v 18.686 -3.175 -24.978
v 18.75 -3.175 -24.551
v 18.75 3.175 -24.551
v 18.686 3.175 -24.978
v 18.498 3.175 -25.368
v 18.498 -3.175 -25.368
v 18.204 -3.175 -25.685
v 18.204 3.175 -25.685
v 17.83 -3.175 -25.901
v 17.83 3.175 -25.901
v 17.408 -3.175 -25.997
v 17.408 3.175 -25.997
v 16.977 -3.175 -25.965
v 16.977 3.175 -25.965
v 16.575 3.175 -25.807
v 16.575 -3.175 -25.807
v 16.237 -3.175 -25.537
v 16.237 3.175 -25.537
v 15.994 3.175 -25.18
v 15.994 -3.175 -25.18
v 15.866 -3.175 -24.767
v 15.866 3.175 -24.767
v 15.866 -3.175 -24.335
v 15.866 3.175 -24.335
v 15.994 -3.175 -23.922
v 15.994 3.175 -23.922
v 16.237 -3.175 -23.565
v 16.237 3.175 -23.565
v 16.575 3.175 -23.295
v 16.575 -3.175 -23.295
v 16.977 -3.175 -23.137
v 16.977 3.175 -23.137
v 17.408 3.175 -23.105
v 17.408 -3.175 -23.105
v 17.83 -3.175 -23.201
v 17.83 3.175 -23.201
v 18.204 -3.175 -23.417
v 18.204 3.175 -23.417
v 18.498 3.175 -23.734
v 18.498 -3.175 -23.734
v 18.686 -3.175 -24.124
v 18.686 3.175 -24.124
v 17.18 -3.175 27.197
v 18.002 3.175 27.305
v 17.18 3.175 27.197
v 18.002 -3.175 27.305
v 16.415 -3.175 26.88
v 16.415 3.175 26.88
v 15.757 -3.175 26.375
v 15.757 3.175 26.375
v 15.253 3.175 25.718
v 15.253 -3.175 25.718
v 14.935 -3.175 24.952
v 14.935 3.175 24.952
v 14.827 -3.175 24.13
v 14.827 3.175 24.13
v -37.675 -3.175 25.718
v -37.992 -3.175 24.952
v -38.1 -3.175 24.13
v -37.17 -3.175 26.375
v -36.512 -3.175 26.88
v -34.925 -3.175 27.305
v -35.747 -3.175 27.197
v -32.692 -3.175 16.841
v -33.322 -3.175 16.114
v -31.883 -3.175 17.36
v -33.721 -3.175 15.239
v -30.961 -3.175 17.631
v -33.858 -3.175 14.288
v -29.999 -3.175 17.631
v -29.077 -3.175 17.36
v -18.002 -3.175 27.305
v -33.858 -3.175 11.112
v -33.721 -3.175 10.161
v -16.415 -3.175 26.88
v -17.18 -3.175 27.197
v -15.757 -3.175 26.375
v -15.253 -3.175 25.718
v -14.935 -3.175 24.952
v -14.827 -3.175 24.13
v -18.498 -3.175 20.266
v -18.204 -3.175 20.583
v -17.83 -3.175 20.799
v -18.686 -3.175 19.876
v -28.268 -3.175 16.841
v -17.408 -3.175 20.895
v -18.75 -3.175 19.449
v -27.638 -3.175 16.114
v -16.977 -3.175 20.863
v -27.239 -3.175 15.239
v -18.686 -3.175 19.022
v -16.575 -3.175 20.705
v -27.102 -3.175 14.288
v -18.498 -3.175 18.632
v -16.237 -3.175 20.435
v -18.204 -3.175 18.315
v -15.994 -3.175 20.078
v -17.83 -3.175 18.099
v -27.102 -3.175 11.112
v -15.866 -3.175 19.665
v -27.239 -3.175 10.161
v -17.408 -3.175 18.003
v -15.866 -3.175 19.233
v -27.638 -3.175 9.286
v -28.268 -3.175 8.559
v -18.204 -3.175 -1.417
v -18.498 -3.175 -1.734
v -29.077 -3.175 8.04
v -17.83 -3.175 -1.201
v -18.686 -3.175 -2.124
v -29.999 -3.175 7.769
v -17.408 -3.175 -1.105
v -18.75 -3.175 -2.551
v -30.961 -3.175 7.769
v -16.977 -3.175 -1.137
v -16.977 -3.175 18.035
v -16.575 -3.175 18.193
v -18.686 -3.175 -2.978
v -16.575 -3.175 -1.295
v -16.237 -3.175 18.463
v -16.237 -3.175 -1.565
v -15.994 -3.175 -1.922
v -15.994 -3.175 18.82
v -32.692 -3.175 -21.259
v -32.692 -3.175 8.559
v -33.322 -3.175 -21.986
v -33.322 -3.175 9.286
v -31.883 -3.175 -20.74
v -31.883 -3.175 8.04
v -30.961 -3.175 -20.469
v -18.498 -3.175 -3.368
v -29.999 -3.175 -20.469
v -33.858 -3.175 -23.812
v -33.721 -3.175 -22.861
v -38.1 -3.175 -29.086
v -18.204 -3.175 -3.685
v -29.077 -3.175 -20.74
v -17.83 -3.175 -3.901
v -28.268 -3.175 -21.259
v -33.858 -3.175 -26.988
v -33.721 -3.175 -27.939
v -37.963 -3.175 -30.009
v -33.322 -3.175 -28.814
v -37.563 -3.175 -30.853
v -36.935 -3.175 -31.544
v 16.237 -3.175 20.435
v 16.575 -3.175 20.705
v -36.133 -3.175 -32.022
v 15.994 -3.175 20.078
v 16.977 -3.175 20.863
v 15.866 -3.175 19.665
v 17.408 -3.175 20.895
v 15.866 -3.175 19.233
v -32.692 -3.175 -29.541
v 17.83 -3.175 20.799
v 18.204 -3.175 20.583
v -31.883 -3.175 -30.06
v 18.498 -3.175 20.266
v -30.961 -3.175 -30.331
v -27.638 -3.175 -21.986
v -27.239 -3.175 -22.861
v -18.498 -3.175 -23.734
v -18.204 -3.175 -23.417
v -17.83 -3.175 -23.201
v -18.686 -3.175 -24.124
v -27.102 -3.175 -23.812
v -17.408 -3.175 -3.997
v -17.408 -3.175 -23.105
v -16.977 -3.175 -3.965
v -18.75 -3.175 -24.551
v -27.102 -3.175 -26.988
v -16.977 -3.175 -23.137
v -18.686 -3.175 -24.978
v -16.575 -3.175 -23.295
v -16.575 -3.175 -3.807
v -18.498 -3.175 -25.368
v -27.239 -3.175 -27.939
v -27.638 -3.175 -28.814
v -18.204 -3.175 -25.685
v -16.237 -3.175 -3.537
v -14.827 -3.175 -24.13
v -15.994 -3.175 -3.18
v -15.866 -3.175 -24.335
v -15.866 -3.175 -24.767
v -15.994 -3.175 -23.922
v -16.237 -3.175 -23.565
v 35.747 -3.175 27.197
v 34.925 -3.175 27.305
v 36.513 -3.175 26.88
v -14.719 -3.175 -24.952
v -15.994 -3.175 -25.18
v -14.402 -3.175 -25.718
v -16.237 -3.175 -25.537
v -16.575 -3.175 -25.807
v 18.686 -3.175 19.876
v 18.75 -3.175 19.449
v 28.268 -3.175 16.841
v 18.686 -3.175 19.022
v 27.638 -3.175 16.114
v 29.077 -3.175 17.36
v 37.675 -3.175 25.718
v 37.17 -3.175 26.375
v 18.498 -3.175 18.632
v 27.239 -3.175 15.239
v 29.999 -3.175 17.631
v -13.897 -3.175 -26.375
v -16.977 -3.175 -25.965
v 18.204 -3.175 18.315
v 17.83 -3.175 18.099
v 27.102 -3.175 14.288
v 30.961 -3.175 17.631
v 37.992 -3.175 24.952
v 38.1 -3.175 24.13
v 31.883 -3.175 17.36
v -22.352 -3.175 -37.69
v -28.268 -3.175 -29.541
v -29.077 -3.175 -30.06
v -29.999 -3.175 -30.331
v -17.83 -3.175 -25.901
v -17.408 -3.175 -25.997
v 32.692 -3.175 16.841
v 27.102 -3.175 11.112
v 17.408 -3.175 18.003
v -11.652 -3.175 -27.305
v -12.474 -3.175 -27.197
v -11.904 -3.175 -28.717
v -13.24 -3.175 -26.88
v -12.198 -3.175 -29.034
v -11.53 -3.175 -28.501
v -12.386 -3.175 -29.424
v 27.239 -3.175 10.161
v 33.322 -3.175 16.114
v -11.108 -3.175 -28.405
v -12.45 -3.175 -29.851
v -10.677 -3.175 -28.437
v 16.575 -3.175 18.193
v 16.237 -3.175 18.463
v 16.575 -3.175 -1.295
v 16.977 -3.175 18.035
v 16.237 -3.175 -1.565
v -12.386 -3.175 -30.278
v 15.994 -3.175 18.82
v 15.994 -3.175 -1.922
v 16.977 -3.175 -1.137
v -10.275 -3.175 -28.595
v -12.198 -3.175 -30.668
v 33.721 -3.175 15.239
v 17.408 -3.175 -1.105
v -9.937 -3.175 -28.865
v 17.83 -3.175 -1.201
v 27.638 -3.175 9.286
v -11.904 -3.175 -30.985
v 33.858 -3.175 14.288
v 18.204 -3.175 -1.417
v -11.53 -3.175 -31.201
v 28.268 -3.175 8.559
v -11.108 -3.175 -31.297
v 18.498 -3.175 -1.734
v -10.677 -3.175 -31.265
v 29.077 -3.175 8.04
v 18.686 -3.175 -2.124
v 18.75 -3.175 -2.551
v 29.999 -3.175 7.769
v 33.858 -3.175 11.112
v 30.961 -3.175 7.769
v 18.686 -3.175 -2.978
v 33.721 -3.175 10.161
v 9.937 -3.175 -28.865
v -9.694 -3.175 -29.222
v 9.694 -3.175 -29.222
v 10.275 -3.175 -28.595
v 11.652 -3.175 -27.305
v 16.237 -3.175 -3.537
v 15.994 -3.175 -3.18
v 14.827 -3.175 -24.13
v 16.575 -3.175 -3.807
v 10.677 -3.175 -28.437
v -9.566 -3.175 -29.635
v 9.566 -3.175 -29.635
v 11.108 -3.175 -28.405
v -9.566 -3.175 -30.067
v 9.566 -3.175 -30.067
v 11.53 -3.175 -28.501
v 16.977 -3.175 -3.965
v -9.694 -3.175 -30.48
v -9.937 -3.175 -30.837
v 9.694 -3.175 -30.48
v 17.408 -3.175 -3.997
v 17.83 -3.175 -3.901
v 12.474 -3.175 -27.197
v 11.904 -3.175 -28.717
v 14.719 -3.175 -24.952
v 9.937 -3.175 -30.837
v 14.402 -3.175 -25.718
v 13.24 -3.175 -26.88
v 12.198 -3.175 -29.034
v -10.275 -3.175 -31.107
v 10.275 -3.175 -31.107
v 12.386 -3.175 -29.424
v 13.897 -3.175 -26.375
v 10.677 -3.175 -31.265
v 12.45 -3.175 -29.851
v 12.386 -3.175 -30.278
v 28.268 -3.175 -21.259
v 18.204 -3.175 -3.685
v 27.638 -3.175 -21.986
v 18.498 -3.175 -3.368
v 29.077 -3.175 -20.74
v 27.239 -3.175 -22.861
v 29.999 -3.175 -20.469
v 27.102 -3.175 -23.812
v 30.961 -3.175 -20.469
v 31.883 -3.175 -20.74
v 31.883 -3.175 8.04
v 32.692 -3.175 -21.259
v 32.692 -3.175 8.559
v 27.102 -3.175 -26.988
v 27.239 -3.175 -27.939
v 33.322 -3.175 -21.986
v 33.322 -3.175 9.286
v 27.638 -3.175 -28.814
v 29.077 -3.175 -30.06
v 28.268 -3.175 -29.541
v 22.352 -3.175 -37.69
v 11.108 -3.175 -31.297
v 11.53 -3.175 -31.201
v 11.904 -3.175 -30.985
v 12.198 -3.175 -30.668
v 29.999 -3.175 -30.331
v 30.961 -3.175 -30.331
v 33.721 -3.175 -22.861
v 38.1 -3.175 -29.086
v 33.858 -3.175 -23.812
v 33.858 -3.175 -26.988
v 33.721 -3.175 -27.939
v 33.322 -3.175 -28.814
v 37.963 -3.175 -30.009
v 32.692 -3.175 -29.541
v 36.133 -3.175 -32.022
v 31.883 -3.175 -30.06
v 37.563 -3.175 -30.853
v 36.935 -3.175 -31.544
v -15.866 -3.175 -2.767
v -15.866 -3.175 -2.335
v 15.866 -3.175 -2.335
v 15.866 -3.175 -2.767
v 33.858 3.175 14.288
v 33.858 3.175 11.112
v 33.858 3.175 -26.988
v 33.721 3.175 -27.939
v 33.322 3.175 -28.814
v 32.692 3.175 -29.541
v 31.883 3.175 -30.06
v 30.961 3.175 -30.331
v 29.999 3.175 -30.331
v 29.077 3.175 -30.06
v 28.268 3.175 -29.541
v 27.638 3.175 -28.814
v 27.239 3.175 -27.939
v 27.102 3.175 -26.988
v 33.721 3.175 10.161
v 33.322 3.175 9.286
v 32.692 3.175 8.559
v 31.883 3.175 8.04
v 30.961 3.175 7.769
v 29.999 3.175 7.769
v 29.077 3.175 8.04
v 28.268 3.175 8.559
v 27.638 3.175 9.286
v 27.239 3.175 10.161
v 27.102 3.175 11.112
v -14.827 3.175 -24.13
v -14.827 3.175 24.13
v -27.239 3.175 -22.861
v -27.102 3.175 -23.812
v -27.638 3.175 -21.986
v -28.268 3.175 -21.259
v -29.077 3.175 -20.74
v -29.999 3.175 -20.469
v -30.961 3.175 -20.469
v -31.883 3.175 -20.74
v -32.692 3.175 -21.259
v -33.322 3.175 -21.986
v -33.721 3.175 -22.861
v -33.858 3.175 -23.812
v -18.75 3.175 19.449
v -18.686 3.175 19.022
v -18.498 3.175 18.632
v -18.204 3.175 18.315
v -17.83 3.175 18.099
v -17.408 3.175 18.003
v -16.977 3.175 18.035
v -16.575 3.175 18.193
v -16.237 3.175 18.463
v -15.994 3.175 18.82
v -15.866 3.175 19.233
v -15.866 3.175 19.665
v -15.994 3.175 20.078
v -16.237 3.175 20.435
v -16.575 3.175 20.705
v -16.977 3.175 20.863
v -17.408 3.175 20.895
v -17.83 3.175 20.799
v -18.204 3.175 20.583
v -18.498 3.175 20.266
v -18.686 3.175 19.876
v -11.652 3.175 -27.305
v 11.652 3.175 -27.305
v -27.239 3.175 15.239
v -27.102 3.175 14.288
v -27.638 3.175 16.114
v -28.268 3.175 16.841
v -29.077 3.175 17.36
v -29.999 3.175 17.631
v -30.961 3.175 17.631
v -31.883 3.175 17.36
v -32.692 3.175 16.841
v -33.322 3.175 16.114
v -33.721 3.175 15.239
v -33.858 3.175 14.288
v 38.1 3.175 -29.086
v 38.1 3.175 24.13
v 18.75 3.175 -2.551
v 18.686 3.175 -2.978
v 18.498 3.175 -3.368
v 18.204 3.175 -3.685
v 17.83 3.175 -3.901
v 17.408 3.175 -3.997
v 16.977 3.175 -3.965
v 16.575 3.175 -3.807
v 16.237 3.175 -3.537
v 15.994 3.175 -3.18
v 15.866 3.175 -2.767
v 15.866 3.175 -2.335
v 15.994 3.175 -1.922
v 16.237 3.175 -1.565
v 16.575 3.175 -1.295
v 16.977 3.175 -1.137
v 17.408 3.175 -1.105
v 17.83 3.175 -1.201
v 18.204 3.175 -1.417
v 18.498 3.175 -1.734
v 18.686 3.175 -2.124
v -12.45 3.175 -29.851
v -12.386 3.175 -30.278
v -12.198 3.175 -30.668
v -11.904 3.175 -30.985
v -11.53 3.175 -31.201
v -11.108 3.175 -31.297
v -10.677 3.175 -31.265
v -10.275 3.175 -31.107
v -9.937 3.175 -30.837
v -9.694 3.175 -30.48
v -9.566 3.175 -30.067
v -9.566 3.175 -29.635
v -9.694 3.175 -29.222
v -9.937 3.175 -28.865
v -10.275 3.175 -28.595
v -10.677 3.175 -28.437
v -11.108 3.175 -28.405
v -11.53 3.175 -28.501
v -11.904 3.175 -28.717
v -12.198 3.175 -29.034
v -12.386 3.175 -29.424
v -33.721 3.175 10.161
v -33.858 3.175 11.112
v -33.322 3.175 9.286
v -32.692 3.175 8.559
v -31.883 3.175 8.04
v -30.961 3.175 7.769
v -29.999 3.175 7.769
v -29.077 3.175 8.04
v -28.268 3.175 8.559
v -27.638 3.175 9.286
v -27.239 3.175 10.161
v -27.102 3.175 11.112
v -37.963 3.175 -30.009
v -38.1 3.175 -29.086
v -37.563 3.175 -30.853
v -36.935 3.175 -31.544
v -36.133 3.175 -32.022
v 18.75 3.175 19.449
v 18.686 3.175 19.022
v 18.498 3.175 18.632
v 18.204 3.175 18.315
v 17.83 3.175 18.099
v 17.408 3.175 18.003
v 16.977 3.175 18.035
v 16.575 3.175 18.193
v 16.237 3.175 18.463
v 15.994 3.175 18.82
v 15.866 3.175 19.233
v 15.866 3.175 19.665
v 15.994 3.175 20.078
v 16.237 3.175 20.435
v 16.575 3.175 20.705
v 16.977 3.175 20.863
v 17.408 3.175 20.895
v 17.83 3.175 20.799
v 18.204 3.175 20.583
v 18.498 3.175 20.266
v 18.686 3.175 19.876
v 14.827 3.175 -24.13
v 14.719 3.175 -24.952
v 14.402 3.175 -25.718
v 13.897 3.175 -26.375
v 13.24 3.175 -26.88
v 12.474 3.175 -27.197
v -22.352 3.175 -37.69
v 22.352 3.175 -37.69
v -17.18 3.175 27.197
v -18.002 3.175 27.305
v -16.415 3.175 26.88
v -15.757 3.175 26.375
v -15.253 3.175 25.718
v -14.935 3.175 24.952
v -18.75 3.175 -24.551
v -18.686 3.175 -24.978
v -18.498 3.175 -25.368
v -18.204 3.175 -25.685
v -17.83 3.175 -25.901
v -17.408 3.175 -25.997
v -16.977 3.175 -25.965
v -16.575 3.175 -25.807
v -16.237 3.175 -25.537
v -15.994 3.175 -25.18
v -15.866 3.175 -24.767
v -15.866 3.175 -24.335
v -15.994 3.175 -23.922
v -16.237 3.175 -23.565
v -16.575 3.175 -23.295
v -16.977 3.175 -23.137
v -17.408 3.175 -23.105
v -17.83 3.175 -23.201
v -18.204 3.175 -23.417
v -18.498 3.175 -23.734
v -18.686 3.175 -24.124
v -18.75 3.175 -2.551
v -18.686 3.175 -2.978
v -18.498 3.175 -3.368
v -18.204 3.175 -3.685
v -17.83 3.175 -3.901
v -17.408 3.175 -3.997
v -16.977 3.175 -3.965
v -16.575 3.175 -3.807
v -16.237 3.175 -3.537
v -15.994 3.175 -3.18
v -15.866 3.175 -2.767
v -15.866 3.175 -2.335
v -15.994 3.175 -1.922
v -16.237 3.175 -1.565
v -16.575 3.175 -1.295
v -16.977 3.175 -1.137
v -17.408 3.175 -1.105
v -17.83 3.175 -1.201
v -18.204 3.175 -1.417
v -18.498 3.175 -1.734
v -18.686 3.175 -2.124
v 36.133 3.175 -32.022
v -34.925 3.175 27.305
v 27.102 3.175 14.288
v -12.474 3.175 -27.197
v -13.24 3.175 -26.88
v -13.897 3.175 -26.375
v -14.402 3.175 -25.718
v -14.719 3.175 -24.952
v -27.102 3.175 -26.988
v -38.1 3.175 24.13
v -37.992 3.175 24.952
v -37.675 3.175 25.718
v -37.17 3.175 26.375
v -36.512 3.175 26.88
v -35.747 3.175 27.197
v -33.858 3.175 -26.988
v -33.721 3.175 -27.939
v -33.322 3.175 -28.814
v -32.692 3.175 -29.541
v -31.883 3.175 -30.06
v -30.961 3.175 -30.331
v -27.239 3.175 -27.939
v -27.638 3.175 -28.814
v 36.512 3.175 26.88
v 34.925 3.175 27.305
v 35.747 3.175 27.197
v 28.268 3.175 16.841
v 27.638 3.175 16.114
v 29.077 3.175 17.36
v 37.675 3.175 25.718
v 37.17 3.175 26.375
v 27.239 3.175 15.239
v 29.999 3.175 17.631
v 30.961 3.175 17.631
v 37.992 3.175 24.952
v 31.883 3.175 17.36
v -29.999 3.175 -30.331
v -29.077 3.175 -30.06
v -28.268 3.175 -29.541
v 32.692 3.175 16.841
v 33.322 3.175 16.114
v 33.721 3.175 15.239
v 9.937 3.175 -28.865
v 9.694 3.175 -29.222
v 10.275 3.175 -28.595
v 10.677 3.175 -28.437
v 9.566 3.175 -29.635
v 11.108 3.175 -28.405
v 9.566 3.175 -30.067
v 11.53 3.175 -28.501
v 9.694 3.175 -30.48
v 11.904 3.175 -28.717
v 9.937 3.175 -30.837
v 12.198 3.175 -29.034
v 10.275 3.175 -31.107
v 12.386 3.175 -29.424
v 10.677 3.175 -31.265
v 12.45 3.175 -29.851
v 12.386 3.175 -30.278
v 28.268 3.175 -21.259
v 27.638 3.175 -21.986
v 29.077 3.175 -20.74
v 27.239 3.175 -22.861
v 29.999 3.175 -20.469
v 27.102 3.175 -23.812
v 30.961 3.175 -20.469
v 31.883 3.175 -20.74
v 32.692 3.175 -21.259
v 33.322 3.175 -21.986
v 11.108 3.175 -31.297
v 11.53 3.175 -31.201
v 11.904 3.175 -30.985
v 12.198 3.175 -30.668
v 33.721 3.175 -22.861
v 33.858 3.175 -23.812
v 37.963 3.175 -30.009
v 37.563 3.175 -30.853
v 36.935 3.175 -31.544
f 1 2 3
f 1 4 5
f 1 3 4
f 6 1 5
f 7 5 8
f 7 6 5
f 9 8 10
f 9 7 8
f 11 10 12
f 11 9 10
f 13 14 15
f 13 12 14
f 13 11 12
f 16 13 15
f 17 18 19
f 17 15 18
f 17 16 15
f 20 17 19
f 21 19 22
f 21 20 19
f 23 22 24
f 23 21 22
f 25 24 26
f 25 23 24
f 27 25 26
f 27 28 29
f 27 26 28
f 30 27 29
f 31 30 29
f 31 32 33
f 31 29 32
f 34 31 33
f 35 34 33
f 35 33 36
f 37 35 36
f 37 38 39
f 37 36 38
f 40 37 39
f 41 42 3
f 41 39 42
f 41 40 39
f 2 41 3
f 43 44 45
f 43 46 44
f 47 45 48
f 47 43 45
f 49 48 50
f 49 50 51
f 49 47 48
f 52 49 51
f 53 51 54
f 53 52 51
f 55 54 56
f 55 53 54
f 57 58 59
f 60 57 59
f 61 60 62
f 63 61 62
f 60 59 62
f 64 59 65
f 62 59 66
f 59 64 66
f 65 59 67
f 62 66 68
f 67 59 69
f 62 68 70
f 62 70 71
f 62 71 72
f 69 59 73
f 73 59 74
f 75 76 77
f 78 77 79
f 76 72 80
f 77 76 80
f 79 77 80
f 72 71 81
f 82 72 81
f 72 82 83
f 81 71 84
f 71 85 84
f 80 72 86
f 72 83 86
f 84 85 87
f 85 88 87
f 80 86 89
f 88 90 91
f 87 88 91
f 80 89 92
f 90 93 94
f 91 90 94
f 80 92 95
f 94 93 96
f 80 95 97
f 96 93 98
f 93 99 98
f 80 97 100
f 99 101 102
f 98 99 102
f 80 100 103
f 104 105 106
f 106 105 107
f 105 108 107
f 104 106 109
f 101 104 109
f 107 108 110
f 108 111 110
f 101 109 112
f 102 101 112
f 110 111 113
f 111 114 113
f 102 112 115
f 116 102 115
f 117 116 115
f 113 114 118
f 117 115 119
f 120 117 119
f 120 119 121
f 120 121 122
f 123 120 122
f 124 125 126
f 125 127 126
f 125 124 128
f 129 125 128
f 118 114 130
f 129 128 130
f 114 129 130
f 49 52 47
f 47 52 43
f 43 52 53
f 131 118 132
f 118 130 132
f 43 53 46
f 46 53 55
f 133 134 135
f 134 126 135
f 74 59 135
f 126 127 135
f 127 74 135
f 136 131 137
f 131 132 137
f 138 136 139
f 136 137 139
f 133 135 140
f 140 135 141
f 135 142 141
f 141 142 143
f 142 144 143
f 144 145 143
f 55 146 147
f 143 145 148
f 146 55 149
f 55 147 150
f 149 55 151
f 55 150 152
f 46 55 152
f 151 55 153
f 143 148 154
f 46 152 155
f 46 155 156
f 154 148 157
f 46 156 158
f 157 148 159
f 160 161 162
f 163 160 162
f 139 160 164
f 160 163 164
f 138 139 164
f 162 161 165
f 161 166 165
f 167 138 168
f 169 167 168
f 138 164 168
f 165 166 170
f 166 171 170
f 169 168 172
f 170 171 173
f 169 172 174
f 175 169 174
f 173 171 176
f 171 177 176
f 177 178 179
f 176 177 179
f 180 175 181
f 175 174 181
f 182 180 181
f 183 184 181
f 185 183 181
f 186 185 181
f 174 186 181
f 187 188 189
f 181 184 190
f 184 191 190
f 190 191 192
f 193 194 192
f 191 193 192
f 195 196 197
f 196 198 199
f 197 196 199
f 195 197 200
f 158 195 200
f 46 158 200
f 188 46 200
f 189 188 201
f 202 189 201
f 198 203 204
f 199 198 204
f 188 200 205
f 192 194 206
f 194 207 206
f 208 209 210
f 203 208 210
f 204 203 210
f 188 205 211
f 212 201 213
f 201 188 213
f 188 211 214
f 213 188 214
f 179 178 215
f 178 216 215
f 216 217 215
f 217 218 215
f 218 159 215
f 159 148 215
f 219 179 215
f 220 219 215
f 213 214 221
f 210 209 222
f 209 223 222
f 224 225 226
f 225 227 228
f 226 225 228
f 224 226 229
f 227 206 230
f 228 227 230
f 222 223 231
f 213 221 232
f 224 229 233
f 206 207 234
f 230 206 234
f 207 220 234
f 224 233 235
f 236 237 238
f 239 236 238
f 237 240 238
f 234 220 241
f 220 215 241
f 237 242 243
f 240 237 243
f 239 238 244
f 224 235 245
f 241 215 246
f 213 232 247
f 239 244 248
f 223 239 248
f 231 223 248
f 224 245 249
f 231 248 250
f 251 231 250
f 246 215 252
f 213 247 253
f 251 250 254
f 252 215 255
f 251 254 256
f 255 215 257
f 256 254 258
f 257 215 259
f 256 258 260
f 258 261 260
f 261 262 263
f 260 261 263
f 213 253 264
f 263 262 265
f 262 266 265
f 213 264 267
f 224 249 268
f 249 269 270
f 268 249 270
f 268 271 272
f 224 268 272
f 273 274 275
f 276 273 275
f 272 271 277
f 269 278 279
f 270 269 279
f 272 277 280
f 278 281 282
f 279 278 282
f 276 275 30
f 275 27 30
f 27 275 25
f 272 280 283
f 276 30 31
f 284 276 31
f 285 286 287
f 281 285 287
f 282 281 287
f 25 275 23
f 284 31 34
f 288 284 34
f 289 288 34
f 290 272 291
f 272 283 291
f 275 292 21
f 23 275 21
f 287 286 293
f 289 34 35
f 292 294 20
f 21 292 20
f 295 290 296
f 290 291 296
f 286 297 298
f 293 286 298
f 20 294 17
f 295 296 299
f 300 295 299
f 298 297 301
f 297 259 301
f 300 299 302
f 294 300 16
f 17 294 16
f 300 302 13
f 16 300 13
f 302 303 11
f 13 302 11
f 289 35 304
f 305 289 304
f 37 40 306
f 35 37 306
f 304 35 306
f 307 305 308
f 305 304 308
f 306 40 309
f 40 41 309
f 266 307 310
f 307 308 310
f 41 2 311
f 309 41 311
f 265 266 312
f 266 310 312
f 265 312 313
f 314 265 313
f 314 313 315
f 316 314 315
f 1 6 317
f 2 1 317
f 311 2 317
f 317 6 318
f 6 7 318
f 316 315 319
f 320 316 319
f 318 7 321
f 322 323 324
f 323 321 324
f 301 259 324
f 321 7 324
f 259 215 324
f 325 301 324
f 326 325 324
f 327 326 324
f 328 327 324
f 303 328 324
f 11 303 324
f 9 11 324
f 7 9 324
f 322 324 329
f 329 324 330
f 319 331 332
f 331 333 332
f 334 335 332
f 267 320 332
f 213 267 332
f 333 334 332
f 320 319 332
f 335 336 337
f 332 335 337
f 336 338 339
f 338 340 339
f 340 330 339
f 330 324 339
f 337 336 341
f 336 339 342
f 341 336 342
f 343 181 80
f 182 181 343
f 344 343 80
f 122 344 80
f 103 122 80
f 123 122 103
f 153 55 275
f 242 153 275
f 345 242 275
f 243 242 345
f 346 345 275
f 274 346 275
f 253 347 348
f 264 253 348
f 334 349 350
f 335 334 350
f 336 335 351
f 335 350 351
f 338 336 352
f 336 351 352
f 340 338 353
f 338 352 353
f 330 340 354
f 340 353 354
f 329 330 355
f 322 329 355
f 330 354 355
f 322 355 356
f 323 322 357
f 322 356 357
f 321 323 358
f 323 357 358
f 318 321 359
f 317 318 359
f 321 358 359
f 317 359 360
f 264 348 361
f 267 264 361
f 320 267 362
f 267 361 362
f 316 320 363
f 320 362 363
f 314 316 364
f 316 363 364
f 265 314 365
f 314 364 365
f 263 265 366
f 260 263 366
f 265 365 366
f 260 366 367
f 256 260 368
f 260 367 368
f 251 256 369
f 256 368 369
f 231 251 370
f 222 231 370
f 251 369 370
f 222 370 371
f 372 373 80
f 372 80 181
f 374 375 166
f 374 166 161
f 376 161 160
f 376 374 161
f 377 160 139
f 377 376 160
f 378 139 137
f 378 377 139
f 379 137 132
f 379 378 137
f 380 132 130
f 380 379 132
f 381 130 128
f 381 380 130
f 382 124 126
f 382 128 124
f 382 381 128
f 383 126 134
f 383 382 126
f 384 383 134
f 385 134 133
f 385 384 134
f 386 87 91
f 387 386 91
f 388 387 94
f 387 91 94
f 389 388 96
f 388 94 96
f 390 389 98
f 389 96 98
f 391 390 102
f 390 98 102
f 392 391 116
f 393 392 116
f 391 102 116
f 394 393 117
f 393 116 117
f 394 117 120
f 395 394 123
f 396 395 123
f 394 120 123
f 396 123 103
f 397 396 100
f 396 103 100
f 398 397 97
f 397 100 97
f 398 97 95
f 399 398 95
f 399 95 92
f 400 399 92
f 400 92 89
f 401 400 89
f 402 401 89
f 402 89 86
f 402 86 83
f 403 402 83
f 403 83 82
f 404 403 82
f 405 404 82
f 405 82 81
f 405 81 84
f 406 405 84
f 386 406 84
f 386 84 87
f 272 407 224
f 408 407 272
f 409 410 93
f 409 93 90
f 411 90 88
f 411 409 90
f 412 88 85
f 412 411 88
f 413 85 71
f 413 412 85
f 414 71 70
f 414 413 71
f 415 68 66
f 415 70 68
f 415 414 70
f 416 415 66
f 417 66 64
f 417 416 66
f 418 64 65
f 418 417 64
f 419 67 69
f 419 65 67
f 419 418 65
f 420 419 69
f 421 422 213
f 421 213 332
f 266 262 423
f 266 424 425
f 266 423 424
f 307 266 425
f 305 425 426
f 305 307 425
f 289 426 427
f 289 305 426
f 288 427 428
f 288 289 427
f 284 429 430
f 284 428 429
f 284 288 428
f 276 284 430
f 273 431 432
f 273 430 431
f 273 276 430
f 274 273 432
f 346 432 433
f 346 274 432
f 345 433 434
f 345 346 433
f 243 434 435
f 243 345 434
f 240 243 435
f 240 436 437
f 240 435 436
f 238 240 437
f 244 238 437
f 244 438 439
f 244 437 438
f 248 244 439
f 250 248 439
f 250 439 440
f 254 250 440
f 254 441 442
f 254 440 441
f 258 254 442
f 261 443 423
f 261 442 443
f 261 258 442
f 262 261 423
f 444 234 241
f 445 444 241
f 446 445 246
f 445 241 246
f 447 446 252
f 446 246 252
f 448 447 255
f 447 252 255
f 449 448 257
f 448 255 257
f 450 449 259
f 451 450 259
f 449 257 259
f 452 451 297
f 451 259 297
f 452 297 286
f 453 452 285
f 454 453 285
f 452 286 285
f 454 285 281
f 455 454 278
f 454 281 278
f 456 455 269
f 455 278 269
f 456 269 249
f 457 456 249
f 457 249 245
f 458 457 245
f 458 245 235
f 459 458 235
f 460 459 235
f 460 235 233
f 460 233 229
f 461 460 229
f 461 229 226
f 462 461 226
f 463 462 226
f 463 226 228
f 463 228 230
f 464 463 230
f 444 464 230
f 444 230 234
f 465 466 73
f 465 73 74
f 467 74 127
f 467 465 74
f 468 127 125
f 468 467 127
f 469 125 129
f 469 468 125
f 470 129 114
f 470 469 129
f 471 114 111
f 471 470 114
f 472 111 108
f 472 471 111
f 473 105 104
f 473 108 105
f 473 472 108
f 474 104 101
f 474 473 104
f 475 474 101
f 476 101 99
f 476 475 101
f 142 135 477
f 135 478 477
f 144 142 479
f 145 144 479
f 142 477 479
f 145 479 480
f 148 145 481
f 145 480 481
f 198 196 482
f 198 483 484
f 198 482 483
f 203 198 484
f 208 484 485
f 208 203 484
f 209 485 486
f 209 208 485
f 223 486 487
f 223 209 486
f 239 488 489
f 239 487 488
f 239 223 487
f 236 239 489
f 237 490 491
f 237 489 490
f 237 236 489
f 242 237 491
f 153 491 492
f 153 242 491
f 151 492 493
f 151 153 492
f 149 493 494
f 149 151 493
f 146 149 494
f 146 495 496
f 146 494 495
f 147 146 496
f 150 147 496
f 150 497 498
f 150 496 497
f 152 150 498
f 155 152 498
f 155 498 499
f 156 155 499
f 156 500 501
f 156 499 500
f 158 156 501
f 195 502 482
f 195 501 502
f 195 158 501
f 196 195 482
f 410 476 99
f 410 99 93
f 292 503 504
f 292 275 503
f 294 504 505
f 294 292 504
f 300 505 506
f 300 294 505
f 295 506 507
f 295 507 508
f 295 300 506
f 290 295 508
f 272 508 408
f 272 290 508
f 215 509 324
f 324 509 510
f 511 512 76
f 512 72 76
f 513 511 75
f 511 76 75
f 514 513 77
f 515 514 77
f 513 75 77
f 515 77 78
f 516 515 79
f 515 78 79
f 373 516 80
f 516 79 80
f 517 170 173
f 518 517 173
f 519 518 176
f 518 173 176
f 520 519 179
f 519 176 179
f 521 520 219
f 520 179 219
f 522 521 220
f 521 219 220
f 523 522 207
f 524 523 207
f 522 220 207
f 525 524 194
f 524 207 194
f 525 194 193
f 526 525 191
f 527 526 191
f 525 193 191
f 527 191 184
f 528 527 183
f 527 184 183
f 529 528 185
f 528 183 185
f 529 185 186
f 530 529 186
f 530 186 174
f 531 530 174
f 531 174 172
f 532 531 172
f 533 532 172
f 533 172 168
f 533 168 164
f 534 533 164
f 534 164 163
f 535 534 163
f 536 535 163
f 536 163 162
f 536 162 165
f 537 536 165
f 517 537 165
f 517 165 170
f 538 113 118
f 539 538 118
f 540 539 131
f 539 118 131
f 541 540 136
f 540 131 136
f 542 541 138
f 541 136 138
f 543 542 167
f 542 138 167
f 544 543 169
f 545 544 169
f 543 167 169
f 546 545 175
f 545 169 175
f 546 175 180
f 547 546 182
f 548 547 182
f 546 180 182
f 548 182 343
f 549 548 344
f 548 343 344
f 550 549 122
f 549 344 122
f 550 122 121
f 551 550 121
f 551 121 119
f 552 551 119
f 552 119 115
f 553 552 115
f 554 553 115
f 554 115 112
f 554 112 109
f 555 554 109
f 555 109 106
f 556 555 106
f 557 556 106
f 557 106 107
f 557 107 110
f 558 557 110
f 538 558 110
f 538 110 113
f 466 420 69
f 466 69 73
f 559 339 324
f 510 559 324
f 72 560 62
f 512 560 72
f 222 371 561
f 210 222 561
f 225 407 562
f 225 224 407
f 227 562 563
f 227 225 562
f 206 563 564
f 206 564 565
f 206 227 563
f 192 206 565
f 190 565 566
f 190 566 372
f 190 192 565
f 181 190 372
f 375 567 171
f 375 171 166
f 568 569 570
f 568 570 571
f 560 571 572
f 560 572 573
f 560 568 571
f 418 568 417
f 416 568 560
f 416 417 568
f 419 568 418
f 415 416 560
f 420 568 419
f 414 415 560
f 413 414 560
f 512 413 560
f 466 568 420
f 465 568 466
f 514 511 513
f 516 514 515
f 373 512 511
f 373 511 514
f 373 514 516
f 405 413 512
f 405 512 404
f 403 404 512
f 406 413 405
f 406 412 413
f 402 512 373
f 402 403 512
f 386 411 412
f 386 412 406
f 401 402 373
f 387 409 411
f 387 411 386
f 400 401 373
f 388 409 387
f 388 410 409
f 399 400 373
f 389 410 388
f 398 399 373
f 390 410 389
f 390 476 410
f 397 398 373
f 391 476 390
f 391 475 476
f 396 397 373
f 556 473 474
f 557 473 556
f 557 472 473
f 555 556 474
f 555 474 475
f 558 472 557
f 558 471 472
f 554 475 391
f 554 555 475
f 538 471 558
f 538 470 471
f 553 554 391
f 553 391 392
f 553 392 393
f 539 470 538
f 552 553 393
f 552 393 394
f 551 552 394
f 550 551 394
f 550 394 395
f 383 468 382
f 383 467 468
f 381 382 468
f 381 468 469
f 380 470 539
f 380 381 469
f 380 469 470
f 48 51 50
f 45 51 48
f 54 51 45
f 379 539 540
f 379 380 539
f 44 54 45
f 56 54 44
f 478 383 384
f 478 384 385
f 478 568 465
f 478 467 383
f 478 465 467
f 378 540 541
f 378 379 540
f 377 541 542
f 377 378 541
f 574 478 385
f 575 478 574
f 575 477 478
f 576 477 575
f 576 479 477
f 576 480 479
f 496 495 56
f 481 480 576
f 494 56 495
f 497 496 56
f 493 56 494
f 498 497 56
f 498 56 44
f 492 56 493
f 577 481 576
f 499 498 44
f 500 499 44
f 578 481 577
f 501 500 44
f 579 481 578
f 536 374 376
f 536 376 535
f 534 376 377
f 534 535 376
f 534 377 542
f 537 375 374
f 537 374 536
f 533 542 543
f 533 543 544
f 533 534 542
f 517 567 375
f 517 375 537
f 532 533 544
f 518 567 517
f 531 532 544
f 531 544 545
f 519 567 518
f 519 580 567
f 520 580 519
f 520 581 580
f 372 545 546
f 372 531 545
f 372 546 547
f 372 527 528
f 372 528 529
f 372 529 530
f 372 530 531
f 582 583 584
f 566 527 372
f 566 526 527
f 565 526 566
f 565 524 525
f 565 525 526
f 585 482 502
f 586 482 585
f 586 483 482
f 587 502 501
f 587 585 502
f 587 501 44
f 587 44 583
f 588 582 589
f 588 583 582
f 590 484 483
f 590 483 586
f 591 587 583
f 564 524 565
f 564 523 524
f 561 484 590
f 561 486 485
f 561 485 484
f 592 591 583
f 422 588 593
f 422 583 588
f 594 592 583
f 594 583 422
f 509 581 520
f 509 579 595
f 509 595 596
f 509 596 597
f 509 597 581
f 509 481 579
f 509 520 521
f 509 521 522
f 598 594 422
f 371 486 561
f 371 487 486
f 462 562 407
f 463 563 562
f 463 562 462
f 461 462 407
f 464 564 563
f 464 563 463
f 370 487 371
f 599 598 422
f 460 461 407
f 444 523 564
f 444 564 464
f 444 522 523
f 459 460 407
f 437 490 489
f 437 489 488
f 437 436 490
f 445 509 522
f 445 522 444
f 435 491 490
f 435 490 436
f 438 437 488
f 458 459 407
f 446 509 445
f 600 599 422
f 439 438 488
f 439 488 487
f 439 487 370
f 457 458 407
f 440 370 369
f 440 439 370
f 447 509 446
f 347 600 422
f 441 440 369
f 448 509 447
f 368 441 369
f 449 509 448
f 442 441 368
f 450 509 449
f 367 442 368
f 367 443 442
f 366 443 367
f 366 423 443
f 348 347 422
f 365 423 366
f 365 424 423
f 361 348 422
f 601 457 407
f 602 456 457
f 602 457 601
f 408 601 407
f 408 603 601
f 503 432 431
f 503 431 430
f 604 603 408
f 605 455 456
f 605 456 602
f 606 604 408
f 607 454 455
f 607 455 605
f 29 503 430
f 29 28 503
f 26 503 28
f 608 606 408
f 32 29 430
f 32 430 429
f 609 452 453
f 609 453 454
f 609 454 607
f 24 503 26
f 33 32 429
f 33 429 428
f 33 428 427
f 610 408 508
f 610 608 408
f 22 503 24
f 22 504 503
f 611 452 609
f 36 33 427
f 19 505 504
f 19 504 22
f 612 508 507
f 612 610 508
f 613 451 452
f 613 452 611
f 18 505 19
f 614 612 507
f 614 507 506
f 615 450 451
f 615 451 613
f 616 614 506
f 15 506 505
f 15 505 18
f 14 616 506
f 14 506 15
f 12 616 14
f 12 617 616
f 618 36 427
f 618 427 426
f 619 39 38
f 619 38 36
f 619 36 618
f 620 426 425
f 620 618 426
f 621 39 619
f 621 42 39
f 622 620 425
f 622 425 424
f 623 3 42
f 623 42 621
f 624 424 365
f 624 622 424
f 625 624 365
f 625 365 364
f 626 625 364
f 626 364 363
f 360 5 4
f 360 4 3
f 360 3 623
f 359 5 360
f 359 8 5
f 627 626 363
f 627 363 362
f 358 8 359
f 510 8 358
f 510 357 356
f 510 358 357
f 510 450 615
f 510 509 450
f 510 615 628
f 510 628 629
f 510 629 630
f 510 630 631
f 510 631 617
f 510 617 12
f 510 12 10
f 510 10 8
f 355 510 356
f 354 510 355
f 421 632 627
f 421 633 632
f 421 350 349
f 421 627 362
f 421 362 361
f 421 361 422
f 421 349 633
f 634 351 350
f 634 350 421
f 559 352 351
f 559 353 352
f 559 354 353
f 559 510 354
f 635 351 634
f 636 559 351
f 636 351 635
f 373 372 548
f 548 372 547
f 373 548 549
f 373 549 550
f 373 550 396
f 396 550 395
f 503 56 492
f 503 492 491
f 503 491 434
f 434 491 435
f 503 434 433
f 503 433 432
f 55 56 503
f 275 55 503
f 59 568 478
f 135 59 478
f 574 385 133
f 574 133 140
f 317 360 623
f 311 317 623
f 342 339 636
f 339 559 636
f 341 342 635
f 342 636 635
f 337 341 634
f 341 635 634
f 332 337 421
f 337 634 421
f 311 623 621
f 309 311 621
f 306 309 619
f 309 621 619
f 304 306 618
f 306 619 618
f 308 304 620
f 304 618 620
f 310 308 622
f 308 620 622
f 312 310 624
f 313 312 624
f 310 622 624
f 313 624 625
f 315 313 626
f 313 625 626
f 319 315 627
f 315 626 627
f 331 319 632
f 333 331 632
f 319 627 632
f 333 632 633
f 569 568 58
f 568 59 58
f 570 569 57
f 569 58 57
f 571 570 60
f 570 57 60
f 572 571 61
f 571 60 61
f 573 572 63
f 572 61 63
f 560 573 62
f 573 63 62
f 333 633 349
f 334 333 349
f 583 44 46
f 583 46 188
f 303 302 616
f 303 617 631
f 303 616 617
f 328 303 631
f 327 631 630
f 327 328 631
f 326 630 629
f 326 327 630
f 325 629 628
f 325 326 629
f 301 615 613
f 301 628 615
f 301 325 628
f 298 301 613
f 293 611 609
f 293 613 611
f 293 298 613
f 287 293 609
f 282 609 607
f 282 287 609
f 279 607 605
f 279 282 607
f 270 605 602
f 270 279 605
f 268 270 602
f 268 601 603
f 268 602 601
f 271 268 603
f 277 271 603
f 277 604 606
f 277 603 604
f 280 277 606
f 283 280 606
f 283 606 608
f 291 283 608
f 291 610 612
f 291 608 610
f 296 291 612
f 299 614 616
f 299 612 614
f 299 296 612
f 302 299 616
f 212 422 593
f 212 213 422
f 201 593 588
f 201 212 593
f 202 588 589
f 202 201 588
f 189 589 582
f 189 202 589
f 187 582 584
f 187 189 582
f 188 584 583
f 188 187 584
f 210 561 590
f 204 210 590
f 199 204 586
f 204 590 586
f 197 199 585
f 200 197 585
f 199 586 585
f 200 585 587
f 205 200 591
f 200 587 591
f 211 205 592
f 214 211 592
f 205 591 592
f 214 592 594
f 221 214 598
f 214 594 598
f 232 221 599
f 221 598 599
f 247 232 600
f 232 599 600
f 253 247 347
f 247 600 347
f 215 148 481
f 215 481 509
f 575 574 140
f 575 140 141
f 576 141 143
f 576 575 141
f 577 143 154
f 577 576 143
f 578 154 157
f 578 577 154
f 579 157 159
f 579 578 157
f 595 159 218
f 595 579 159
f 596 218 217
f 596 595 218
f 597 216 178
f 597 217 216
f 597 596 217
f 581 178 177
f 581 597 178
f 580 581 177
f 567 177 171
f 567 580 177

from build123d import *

# Parameters (mm, degrees)
SKETCH1_W              = 76.2
SKETCH1_H              = 76.2
BOSS_EXTRUDE1_DEPTH    = 3.175
SKETCH2_W              = 29.6545
SKETCH2_H              = 54.61
CUT_EXTRUDE1_DEPTH     = 55.254423783
M2_5_CLEARANCE_HOLE1_D = 2.9
CUT_EXTRUDE2_DEPTH     = 55.254423783
SKETCH9_W              = 76.2
SKETCH9_H              = 10.795
SKETCH9_H_2            = 0.41
CUT_EXTRUDE3_DEPTH     = 55.254423783
CUT_EXTRUDE4_DEPTH     = 54.967291946
FILLET1_R              = 3.175


with BuildPart() as part:
    # Sketch1 → Boss-Extrude1 (new, symmetric)
    with BuildSketch(Plane(origin=(0, 0, 0), x_dir=(1, 0, 0), z_dir=(0, 1, 0))):
        Rectangle(SKETCH1_W, SKETCH1_H)
    extrude(amount=BOSS_EXTRUDE1_DEPTH, both=True)

    # Sketch2 → Cut-Extrude1 (cut, through all)
    with BuildSketch(Plane(origin=(0, 3.175, 0), x_dir=(1, 0, 0), z_dir=(0, 1, 0))):
        Rectangle(SKETCH2_W, SKETCH2_H)
    extrude(amount=-CUT_EXTRUDE1_DEPTH, mode=Mode.SUBTRACT)

    # M2.5 Clearance Hole1 (through all)
    with Locations(Plane(origin=(0, 3.175, 0), x_dir=(1, 0, 0), z_dir=(0, 1, 0))):
        with Locations((-17.3, 24.551), (-11, 29.851), (-17.3, 2.551), (-17.3, -19.449)):
            m2_5_clearance_hole1 = Hole(M2_5_CLEARANCE_HOLE1_D / 2)

    # Sketch8 → Cut-Extrude2 (cut, through all)
    with BuildSketch(Plane(origin=(0, 3.175, 0), x_dir=(1, 0, 0), z_dir=(0, 1, 0))):
        with BuildLine():
            Line((-33.8582, -14.2875), (-33.8582, -11.1125))
            ThreePointArc((-33.8582, -11.1125), (-30.48, -7.7343), (-27.1018, -11.1125))
            Line((-27.1018, -11.1125), (-27.1018, -14.2875))
            ThreePointArc((-27.1018, -14.2875), (-30.48, -17.6657), (-33.8582, -14.2875))
        make_face()
        with BuildLine():
            Line((-33.8582, 23.8125), (-33.8582, 26.9875))
            ThreePointArc((-33.8582, 26.9875), (-30.48, 30.3657), (-27.1018, 26.9875))
            Line((-27.1018, 26.9875), (-27.1018, 23.8125))
            ThreePointArc((-27.1018, 23.8125), (-30.48, 20.4343), (-33.8582, 23.8125))
        make_face()
    cut_extrude2 = extrude(amount=-CUT_EXTRUDE2_DEPTH, mode=Mode.SUBTRACT)

    # Mirror1: M2.5 Clearance Hole1, Cut-Extrude2 across plane
    add(m2_5_clearance_hole1.mirror(Plane(origin=(0, 0, 0), x_dir=(0, 0, 1), z_dir=(1, 0, 0))), mode=Mode.SUBTRACT)
    add(cut_extrude2.mirror(Plane(origin=(0, 0, 0), x_dir=(0, 0, 1), z_dir=(1, 0, 0))), mode=Mode.SUBTRACT)

    # Sketch9 → Cut-Extrude3 (cut, through all)
    with BuildSketch(Plane(origin=(0, 3.175, 0), x_dir=(1, 0, 0), z_dir=(0, 1, 0))):
        with Locations((0, -32.7025)):
            Rectangle(SKETCH9_W, SKETCH9_H)
        with Locations((0, 37.895)):
            Rectangle(SKETCH9_W, SKETCH9_H_2)
    extrude(amount=-CUT_EXTRUDE3_DEPTH, mode=Mode.SUBTRACT)

    # Sketch13 → Cut-Extrude4 (cut, through all)
    with BuildSketch(Plane.XZ.offset(3.175)):
        Polygon((-38.1, -31.213), (-22.352, -37.69), (-38.1, -37.69), align=None)
    cut_extrude4 = extrude(amount=-CUT_EXTRUDE4_DEPTH, mode=Mode.SUBTRACT)

    # Mirror3: Cut-Extrude4 across plane
    add(cut_extrude4.mirror(Plane(origin=(0, 0, 0), x_dir=(0, 0, 1), z_dir=(1, 0, 0))), mode=Mode.SUBTRACT)

    # Fillet1
    fillet1_edges = [part.edges().sort_by_distance(p)[0] for p in [
        (-38.1, 0, 27.305),
        (38.1, 0, 27.305),
        (-38.1, 0, -31.213),
        (14.82725, 0, -27.305),
        (38.1, 0, -31.213),
        (14.82725, 0, 27.305),
        (-14.82725, 0, 27.305),
        (-14.82725, 0, -27.305),
    ]]
    fillet(fillet1_edges, radius=FILLET1_R)


solid = part.part
